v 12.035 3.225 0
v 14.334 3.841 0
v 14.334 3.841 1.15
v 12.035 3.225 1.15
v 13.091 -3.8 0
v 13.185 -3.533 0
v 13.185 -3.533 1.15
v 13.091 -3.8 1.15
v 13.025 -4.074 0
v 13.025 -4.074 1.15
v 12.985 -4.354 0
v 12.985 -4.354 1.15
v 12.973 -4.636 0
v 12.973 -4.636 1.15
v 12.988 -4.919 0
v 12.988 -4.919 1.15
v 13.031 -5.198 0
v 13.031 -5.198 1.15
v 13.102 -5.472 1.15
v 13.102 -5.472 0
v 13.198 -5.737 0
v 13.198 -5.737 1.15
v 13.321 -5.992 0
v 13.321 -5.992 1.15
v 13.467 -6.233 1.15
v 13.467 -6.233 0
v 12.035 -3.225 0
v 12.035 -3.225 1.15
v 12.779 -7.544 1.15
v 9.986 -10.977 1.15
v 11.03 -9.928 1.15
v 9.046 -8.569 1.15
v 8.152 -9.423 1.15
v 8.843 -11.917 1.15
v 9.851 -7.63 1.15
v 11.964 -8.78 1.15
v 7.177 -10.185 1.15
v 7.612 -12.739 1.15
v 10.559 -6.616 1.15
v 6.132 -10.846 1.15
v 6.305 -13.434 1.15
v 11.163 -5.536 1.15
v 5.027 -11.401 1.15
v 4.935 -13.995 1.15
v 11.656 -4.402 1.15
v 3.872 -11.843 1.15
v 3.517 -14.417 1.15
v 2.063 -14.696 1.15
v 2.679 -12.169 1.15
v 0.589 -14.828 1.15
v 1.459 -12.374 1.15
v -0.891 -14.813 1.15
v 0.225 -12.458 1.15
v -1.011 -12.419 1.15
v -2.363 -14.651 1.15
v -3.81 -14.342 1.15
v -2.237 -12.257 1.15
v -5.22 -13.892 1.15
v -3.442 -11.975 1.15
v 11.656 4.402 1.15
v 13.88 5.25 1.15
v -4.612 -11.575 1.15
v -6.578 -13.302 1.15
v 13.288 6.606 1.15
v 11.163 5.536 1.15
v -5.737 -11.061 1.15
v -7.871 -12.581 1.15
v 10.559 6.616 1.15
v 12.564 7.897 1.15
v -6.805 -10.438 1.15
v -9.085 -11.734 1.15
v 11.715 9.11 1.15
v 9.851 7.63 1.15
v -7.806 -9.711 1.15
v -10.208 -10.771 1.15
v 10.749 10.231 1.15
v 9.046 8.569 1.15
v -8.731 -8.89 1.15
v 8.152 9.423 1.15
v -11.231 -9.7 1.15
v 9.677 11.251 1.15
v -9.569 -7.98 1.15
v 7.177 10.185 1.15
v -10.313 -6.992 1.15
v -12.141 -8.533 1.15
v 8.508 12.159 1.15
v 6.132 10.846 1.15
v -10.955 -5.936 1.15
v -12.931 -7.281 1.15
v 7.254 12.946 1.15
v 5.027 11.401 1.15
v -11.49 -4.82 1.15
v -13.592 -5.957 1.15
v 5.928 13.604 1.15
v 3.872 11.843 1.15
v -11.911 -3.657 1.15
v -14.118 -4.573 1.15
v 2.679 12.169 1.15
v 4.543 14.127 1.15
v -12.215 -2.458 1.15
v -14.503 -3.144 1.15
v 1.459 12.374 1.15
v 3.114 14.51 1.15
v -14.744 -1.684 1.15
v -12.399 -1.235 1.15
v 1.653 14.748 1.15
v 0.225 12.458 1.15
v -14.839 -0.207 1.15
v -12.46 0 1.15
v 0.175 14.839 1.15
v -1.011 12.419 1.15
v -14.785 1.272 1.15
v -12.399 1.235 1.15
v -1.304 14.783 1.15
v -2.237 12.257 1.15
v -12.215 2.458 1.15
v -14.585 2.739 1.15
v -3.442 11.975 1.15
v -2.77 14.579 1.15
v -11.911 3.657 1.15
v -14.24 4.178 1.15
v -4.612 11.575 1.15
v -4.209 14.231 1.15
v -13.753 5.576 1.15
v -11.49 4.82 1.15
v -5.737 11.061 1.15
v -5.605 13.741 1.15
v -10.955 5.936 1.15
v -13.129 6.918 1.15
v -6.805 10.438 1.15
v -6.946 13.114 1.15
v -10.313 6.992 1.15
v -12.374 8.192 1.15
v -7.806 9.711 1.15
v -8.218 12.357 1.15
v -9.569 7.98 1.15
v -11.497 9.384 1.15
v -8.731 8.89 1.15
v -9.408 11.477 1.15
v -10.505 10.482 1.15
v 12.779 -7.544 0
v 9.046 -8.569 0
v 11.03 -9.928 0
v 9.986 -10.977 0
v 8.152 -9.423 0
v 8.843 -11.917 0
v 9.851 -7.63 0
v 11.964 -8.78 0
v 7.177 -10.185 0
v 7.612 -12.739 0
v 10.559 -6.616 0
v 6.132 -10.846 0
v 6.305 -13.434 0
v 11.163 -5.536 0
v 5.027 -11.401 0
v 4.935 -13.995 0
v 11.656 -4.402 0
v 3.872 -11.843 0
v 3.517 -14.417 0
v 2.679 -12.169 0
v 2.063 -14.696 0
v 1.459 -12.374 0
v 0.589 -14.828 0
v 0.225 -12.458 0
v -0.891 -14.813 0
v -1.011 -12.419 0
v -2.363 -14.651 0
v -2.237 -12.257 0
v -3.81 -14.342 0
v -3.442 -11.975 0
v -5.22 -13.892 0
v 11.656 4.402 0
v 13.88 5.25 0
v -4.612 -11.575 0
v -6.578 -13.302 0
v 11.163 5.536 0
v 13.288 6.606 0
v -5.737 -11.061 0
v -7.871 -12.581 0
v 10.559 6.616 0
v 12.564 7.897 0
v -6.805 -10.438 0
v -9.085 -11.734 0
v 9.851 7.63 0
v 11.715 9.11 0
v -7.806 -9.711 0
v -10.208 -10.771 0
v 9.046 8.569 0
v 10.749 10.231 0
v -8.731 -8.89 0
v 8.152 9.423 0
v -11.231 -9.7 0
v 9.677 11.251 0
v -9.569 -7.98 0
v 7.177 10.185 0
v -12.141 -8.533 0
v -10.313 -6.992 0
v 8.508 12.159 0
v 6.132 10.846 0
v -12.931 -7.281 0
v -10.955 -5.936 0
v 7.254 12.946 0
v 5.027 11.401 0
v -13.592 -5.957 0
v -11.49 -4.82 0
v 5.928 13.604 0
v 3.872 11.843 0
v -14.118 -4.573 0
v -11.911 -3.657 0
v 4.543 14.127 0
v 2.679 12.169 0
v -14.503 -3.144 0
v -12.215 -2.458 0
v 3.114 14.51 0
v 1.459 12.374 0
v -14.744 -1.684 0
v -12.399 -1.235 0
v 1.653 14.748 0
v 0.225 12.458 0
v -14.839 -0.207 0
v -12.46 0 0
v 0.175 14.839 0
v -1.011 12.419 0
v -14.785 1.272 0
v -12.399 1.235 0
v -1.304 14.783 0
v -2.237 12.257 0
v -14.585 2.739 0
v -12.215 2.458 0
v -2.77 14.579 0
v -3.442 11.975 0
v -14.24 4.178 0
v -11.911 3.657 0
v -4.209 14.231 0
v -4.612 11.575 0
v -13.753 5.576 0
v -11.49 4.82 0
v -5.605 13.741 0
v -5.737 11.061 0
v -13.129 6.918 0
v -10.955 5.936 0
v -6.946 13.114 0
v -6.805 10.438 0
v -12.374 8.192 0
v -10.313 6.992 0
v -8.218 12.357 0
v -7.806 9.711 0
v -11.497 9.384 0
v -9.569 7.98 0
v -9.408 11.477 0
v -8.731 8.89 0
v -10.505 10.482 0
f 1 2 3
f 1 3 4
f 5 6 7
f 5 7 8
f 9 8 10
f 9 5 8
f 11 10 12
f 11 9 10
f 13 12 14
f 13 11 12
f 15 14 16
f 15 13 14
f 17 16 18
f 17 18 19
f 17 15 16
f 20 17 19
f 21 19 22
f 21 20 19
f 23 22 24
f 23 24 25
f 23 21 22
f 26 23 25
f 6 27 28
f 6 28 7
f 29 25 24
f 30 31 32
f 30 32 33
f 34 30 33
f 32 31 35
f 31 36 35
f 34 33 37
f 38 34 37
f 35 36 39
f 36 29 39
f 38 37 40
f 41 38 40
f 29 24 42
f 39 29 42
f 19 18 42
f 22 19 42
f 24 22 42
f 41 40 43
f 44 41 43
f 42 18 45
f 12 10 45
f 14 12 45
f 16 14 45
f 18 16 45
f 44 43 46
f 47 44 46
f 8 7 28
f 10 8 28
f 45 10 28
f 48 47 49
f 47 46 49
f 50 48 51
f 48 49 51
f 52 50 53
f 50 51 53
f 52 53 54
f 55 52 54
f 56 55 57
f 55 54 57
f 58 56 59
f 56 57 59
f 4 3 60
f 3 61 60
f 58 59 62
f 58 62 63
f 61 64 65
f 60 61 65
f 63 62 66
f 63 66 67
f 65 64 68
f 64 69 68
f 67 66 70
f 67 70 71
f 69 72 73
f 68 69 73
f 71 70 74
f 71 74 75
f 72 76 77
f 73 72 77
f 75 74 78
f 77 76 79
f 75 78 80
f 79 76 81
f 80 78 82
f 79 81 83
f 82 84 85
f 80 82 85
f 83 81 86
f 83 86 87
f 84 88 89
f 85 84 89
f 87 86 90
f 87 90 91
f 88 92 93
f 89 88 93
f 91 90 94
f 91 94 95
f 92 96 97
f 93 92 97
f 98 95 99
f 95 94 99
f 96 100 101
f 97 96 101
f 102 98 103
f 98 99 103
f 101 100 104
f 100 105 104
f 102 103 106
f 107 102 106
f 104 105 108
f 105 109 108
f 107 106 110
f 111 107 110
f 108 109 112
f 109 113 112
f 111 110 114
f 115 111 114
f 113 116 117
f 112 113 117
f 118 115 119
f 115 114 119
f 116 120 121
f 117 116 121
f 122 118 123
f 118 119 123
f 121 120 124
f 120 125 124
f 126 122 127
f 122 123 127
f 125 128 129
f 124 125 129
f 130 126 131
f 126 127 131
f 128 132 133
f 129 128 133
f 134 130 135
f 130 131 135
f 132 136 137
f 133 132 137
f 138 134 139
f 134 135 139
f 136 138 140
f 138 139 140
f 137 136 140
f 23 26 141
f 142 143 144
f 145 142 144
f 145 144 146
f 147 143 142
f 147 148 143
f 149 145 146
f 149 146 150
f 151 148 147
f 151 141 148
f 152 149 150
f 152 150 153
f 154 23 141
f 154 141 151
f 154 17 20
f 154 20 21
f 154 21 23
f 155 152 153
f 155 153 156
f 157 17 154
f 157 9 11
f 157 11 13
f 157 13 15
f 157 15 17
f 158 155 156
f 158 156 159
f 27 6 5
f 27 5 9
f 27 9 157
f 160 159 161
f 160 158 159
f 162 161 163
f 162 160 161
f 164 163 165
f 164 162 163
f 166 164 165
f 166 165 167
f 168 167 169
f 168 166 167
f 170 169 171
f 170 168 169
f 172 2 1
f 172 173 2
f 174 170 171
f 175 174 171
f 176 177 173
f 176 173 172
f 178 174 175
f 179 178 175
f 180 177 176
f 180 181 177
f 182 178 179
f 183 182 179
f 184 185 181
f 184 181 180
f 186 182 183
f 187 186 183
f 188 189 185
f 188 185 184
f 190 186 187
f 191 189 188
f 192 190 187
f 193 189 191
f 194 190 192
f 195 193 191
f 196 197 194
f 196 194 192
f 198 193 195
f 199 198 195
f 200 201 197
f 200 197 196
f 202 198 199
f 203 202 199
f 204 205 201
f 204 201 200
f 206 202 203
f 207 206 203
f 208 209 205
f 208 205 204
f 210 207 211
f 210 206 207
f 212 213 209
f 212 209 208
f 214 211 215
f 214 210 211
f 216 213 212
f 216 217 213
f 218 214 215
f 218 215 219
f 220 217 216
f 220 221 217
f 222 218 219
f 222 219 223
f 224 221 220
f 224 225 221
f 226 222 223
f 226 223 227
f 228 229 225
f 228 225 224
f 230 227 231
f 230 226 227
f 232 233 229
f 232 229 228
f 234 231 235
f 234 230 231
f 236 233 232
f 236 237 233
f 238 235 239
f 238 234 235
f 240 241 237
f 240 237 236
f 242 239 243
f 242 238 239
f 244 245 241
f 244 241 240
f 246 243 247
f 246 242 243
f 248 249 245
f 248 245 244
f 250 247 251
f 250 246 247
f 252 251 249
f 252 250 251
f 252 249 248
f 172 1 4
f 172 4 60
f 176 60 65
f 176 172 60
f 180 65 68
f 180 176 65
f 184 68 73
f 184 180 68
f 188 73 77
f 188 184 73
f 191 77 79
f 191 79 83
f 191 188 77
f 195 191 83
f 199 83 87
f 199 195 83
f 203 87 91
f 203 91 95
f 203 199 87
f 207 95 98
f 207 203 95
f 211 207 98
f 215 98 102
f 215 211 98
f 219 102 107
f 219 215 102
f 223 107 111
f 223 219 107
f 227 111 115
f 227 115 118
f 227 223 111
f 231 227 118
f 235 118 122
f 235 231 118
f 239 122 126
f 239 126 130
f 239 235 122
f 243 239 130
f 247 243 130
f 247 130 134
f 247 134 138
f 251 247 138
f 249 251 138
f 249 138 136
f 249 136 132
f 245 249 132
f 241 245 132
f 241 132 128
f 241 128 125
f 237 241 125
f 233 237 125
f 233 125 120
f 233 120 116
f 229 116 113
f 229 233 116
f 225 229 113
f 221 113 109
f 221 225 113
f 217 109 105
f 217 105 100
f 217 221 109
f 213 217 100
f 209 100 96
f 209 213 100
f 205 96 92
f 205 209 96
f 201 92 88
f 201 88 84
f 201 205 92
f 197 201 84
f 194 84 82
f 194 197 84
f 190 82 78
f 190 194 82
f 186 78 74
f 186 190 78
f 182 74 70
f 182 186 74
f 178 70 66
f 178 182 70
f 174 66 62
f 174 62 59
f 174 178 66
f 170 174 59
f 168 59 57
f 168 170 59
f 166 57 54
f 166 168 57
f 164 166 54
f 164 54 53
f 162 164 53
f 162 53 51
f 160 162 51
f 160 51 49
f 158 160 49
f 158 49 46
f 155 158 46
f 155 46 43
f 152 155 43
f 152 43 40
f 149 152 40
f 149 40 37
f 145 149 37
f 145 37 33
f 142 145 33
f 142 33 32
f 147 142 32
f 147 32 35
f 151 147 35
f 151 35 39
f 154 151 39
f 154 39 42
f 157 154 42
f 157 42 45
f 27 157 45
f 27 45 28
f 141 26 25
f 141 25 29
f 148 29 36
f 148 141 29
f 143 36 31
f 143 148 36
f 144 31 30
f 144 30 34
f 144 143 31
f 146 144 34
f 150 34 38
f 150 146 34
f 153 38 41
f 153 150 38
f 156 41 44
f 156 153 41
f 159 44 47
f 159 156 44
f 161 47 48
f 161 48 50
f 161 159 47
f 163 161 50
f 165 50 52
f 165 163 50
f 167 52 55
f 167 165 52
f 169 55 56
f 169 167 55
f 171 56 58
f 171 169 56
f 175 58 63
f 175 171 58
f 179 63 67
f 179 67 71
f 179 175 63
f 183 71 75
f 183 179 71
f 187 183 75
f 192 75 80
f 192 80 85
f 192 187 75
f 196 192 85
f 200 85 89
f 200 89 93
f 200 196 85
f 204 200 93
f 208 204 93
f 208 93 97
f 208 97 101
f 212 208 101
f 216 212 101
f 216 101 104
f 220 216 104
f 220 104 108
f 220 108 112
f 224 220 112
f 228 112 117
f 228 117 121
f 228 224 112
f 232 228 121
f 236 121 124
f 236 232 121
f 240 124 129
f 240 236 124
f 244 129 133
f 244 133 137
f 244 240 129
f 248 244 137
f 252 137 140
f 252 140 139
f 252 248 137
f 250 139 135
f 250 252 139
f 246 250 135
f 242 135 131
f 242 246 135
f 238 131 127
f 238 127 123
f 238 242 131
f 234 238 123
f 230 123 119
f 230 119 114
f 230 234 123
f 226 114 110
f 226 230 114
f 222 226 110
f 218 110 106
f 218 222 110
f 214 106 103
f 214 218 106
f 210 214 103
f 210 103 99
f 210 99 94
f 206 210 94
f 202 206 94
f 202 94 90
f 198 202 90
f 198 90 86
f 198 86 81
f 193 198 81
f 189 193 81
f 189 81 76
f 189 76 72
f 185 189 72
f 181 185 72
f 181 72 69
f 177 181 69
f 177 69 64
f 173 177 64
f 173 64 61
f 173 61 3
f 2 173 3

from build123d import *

# Parameters (mm, degrees)
BOSS_EXTRUDE1_DEPTH = 1.15


with BuildPart() as part:
    # Sketch1 → Boss-Extrude1 (new body)
    with BuildSketch(Plane(origin=(0, 0, 0), x_dir=(-1, 0, 0), z_dir=(0, 0, -1))):
        with BuildLine():
            Line((-14.334339262, 3.840874629), (-12.035435796, 3.224885302))
            ThreePointArc((-12.035435796, 3.224885302), (12.46, 0), (-12.035435796, -3.224885302))
            Line((-12.035435796, -3.224885302), (-13.184887529, -3.532879966))
            ThreePointArc((-13.184887529, -3.532879966), (-12.98832562, -4.918513333), (-13.467338447, -6.233489806))
            ThreePointArc((-13.467338447, -6.233489806), (14.785348341, 1.272428564), (-14.334339262, 3.840874629))
        make_face()
    extrude(amount=-BOSS_EXTRUDE1_DEPTH)


solid = part.part
